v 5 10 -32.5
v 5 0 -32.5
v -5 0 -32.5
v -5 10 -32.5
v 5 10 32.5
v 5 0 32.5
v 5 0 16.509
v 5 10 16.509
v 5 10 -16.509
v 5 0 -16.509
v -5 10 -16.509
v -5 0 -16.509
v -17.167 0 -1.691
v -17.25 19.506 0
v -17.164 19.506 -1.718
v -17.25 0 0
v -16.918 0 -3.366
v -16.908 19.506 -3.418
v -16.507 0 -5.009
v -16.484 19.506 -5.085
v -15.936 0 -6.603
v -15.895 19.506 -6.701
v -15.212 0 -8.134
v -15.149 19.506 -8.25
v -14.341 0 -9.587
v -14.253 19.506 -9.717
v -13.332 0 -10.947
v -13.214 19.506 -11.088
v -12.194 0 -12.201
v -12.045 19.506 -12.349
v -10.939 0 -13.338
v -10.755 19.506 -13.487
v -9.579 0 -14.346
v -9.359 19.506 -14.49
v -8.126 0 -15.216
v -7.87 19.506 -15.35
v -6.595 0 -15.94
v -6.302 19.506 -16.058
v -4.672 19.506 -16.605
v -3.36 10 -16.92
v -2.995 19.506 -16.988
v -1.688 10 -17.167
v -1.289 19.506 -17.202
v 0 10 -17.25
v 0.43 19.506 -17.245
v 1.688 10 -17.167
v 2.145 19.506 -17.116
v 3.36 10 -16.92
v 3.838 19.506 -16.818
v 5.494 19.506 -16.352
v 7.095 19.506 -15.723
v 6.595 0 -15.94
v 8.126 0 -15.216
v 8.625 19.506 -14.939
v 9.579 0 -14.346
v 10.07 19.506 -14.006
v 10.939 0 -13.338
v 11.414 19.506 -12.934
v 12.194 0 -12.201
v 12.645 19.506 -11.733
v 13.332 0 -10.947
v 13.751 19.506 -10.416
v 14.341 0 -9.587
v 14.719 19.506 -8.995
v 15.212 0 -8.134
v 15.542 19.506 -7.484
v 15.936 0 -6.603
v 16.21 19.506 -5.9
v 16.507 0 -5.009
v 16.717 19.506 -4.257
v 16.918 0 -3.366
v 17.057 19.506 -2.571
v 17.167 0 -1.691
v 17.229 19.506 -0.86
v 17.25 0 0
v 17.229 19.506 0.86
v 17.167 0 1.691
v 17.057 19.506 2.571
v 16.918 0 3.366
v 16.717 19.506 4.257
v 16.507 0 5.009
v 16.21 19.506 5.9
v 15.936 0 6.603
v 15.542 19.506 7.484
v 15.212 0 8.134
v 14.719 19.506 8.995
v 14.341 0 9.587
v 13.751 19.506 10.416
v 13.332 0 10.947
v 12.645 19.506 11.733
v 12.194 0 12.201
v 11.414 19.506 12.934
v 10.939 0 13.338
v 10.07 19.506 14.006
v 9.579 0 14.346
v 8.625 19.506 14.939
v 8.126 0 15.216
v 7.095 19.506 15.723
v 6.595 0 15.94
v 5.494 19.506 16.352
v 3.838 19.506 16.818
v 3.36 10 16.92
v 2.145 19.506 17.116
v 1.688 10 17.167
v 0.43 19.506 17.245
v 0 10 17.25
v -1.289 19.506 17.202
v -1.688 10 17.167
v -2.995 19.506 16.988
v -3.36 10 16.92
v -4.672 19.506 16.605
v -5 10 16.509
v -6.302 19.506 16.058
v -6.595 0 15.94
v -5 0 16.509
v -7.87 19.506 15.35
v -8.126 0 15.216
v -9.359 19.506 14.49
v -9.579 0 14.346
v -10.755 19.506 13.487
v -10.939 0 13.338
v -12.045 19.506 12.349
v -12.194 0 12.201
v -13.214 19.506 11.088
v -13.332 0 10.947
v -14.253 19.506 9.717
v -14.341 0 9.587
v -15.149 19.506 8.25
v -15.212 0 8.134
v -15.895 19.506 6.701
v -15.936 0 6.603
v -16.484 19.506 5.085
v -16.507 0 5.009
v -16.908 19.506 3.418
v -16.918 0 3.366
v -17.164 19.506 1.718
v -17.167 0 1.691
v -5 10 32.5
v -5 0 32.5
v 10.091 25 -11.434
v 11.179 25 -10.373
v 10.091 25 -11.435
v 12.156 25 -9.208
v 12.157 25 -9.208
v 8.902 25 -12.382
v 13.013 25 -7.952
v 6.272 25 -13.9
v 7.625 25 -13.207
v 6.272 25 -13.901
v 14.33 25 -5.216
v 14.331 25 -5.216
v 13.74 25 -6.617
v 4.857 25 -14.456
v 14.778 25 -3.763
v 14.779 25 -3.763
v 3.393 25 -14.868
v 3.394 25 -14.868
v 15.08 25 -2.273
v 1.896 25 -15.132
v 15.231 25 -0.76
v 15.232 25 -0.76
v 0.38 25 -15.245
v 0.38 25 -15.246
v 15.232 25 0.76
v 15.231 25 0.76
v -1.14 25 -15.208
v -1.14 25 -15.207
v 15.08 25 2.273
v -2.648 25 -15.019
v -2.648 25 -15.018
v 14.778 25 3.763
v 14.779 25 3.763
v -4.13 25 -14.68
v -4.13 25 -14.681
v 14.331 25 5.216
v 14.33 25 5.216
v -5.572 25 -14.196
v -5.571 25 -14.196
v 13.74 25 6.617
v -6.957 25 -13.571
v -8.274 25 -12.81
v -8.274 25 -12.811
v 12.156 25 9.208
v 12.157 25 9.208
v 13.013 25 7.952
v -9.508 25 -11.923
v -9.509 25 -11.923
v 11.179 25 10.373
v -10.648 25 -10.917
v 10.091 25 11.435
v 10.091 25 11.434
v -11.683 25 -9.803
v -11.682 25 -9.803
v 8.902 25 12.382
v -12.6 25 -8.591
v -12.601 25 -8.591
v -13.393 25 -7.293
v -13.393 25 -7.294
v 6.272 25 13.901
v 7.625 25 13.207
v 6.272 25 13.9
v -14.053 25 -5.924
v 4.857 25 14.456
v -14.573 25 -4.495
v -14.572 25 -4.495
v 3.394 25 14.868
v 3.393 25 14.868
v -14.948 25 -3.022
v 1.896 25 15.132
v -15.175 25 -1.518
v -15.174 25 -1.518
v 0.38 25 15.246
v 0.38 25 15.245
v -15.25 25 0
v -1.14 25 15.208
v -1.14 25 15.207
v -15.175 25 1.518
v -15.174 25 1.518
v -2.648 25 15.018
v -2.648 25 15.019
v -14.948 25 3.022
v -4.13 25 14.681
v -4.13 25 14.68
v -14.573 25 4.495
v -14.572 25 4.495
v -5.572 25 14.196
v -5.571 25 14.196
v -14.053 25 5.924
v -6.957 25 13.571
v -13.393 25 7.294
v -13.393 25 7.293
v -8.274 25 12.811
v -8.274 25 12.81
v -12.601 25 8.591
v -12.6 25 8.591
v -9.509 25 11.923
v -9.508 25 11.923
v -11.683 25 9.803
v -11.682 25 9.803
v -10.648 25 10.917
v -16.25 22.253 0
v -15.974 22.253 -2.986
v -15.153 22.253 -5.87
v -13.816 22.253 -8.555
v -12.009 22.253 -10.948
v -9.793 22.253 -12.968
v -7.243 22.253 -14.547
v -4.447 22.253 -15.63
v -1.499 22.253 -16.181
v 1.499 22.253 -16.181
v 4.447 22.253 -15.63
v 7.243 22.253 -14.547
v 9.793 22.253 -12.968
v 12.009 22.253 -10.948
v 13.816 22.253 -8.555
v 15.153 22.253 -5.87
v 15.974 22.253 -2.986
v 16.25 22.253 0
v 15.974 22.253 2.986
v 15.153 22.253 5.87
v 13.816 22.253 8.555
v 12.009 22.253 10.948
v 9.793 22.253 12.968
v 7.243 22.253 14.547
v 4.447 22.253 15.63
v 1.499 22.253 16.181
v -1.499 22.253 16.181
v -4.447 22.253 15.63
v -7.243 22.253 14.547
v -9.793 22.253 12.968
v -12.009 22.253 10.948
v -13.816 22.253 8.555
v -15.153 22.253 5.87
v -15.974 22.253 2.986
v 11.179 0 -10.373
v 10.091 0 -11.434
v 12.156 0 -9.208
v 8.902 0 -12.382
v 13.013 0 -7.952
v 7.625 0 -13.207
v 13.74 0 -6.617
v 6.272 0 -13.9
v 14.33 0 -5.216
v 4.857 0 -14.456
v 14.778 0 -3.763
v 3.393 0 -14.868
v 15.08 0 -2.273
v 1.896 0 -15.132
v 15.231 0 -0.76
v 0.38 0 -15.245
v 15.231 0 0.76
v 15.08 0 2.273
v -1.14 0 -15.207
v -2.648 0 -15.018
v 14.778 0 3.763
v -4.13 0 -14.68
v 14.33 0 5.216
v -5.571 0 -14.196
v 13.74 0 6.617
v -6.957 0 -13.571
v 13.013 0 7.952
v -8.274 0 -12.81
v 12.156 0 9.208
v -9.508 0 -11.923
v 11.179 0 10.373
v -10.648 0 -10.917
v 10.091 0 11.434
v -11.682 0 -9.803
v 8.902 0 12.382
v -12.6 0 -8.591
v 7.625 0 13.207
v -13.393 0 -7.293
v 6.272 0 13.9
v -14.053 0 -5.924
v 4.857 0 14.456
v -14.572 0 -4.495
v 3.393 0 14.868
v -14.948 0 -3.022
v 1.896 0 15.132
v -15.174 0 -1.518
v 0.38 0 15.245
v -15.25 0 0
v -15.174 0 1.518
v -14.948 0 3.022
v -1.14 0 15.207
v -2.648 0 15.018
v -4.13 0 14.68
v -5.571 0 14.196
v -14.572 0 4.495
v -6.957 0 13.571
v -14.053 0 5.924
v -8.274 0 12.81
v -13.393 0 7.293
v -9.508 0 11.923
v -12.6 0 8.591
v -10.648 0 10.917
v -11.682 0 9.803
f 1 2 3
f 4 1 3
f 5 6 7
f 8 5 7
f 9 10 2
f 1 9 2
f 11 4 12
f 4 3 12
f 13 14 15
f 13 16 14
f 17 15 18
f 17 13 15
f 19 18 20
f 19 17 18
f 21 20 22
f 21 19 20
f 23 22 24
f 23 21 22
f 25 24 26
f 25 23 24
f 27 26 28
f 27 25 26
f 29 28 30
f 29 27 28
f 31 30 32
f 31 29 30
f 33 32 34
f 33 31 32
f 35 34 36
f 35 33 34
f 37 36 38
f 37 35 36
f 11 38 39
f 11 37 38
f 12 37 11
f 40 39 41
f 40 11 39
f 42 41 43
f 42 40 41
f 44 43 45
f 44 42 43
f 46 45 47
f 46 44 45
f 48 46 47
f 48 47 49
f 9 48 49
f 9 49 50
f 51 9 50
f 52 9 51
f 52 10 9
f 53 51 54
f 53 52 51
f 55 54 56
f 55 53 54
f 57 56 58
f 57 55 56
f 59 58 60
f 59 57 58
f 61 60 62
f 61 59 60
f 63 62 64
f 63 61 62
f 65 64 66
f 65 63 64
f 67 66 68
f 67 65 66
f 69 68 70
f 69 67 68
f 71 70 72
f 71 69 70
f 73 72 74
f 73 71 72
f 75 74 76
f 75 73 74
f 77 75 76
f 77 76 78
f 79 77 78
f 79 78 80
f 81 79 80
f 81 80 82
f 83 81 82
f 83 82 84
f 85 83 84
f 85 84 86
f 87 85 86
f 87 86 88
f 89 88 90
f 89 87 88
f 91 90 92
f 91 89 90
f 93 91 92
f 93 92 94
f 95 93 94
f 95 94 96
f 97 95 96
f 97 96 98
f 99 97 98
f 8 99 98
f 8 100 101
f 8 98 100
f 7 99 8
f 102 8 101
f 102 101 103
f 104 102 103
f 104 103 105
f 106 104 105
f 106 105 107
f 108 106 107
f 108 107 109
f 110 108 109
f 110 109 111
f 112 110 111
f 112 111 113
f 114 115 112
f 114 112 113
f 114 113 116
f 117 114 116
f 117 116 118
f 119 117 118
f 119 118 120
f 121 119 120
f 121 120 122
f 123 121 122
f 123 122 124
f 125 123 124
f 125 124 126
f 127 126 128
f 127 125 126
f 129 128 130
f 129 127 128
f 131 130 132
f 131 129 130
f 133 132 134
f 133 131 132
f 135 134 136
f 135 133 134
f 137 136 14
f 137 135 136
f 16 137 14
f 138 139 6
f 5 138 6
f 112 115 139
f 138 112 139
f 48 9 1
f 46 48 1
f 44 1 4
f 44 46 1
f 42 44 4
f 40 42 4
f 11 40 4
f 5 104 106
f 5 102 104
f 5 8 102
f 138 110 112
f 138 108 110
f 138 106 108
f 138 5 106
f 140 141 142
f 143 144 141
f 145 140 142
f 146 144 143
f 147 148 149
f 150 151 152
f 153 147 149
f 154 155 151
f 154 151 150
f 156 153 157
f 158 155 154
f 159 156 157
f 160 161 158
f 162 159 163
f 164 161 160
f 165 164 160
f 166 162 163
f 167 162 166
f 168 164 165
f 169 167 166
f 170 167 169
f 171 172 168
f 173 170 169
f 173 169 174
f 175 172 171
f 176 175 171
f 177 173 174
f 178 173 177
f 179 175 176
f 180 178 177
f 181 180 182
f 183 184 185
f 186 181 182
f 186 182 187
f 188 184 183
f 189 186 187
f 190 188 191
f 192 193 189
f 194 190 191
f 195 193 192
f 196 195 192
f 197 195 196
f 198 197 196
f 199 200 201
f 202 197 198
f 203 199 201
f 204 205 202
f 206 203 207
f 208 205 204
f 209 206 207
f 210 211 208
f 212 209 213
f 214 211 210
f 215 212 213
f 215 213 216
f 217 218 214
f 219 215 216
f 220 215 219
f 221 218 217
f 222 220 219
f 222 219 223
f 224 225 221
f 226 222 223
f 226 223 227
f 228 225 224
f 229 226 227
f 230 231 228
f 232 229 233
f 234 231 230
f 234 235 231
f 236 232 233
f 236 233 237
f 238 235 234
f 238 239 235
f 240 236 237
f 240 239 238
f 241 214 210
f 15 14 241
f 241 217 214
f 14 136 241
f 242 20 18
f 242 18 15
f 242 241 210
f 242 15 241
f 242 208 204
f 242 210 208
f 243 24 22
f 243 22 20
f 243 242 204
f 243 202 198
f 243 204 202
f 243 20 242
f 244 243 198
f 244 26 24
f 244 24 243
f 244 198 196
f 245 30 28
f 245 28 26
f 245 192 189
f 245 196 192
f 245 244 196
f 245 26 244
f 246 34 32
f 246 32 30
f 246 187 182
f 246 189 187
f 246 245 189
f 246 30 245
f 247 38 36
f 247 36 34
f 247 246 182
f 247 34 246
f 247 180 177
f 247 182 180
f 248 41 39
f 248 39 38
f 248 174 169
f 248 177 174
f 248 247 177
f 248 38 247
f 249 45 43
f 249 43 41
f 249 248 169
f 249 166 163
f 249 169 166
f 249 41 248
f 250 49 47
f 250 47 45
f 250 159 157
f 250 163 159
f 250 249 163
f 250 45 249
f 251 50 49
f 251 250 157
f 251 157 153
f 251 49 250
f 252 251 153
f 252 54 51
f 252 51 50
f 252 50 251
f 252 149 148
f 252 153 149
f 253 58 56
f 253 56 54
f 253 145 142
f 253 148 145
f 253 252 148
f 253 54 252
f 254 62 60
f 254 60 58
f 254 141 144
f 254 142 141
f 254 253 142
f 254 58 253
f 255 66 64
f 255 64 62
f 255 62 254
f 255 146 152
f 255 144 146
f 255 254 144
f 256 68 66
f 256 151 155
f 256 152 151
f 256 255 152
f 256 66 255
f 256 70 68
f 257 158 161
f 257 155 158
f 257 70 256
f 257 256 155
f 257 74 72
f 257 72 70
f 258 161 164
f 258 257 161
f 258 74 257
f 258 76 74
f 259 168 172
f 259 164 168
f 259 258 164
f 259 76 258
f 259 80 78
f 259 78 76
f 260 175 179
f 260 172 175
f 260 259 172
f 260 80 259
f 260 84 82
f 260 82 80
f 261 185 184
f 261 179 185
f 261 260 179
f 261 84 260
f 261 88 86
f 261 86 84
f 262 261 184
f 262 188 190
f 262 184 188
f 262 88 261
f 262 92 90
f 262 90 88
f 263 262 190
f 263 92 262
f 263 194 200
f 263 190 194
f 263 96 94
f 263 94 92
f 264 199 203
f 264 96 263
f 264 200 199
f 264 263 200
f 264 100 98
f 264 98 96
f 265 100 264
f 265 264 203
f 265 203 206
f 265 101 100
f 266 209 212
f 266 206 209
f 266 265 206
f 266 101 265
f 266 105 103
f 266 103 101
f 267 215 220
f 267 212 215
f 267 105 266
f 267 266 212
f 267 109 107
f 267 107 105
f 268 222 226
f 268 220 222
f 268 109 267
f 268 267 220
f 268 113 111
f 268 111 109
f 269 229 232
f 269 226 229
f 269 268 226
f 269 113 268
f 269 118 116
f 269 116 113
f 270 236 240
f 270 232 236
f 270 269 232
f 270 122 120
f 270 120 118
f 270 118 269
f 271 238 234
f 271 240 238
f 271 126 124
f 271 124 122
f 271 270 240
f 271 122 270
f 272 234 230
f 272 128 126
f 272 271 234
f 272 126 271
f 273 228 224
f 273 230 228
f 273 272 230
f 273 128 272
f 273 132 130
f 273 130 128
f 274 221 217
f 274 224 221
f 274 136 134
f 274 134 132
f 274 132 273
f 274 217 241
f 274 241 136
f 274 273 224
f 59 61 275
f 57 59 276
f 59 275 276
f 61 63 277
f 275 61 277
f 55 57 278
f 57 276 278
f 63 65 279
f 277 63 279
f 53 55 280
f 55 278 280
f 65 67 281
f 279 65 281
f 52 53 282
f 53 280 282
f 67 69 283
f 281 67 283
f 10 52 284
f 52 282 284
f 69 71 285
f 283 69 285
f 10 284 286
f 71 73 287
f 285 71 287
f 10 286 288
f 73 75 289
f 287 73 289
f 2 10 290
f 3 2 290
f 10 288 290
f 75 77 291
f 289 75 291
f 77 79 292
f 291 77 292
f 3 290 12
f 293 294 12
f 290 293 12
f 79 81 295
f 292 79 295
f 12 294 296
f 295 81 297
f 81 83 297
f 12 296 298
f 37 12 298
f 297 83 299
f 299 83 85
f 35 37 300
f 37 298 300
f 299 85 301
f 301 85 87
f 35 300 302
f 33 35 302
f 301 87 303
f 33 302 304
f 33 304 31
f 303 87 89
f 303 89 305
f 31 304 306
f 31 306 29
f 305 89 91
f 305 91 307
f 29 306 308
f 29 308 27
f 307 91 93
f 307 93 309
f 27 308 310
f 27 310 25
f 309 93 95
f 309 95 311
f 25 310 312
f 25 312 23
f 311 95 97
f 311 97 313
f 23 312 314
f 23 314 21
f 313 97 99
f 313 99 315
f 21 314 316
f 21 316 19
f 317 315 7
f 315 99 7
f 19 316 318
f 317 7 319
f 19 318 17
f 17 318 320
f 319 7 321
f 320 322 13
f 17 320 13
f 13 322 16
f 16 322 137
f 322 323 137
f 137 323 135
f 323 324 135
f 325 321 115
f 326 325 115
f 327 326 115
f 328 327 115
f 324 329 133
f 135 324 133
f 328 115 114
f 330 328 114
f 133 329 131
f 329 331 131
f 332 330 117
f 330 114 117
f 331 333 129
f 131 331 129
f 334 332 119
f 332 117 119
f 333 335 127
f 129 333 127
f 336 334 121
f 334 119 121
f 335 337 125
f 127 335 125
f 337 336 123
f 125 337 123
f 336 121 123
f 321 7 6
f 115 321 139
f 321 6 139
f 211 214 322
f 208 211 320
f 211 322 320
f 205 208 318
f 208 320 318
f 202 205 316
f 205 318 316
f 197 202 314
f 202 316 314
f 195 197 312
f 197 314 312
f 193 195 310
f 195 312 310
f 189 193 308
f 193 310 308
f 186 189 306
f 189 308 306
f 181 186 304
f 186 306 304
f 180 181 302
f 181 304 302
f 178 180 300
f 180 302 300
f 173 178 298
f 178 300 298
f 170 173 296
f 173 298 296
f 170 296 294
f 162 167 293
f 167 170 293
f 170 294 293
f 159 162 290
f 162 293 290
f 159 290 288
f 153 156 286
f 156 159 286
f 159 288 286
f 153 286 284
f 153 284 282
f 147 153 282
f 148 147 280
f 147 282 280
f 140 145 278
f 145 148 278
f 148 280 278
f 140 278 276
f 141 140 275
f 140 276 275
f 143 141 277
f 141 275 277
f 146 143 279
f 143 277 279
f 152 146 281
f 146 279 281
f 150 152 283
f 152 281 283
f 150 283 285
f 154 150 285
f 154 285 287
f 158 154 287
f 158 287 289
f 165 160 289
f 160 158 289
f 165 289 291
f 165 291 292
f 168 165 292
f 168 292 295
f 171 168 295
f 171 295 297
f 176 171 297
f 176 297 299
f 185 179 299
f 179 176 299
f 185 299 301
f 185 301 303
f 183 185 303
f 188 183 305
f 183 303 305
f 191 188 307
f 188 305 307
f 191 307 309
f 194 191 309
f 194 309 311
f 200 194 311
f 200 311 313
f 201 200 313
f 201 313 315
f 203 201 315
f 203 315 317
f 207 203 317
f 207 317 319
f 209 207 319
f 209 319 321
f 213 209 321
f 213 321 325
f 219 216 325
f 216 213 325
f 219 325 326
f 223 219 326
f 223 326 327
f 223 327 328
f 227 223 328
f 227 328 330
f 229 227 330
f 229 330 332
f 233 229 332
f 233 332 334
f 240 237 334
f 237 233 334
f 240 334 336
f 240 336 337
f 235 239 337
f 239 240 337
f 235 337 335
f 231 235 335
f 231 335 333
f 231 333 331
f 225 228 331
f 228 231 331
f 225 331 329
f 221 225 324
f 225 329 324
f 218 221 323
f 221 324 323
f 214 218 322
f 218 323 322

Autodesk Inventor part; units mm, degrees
ref_plane "YZ Plane" through (0, 0, 0) normal (1, 0, 0) x (0, 1, 0)
ref_plane "XZ Plane" through (0, 0, 0) normal (0, 1, 0) x (-1, 0, 0)
ref_plane "XY Plane" through (0, 0, 0) normal (0, 0, 1) x (1, 0, 0)
sketch "Sketch1" plane through (0, 0, 0) normal (0, 1, 0) x (-1, 0, 0)
  circle A0 centre (0, 0) radius 15.25
  circle A1 centre (0, 0) radius 17.25
  line L0 (5, 32.5) -> (-5, 32.5)
  line L1 (-5, 32.5) -> (-5, -32.5)
  line L2 (-5, -32.5) -> (5, -32.5)
  line L3 (5, -32.5) -> (5, 32.5)
  point P0 (0, -32.5)
  point P1 (5, 0)
  point P2 (5, -16.5095)
  point P3 (-5, -16.5095)
  point P4 (-5, 16.5095)
  point P5 (5, 16.5095)
  dimension "d0" = 30.5
  dimension "d1" = 2
  dimension "d7" = 10
  dimension "d8" = 65
extrude "Extrusion1" add sketch "Sketch1" along normal blind 25 contours A0 L3 A1 | A0 L1 A1 L3 | L3 A1 L1 A0 | A0 L1 A1
chamfer "Chamfer1" distance 2 angle 70 1 edges at (17.25, 25, 0) measured on face at (-16.4162, 25, -1.3761)
extrude "Extrusion2" add sketch "Sketch1" along normal blind 10 contours A1 L1 L0 L3 | L3 L2 L1 A1
properties part number "Pope8697-StopperCutter_3DPrint"
